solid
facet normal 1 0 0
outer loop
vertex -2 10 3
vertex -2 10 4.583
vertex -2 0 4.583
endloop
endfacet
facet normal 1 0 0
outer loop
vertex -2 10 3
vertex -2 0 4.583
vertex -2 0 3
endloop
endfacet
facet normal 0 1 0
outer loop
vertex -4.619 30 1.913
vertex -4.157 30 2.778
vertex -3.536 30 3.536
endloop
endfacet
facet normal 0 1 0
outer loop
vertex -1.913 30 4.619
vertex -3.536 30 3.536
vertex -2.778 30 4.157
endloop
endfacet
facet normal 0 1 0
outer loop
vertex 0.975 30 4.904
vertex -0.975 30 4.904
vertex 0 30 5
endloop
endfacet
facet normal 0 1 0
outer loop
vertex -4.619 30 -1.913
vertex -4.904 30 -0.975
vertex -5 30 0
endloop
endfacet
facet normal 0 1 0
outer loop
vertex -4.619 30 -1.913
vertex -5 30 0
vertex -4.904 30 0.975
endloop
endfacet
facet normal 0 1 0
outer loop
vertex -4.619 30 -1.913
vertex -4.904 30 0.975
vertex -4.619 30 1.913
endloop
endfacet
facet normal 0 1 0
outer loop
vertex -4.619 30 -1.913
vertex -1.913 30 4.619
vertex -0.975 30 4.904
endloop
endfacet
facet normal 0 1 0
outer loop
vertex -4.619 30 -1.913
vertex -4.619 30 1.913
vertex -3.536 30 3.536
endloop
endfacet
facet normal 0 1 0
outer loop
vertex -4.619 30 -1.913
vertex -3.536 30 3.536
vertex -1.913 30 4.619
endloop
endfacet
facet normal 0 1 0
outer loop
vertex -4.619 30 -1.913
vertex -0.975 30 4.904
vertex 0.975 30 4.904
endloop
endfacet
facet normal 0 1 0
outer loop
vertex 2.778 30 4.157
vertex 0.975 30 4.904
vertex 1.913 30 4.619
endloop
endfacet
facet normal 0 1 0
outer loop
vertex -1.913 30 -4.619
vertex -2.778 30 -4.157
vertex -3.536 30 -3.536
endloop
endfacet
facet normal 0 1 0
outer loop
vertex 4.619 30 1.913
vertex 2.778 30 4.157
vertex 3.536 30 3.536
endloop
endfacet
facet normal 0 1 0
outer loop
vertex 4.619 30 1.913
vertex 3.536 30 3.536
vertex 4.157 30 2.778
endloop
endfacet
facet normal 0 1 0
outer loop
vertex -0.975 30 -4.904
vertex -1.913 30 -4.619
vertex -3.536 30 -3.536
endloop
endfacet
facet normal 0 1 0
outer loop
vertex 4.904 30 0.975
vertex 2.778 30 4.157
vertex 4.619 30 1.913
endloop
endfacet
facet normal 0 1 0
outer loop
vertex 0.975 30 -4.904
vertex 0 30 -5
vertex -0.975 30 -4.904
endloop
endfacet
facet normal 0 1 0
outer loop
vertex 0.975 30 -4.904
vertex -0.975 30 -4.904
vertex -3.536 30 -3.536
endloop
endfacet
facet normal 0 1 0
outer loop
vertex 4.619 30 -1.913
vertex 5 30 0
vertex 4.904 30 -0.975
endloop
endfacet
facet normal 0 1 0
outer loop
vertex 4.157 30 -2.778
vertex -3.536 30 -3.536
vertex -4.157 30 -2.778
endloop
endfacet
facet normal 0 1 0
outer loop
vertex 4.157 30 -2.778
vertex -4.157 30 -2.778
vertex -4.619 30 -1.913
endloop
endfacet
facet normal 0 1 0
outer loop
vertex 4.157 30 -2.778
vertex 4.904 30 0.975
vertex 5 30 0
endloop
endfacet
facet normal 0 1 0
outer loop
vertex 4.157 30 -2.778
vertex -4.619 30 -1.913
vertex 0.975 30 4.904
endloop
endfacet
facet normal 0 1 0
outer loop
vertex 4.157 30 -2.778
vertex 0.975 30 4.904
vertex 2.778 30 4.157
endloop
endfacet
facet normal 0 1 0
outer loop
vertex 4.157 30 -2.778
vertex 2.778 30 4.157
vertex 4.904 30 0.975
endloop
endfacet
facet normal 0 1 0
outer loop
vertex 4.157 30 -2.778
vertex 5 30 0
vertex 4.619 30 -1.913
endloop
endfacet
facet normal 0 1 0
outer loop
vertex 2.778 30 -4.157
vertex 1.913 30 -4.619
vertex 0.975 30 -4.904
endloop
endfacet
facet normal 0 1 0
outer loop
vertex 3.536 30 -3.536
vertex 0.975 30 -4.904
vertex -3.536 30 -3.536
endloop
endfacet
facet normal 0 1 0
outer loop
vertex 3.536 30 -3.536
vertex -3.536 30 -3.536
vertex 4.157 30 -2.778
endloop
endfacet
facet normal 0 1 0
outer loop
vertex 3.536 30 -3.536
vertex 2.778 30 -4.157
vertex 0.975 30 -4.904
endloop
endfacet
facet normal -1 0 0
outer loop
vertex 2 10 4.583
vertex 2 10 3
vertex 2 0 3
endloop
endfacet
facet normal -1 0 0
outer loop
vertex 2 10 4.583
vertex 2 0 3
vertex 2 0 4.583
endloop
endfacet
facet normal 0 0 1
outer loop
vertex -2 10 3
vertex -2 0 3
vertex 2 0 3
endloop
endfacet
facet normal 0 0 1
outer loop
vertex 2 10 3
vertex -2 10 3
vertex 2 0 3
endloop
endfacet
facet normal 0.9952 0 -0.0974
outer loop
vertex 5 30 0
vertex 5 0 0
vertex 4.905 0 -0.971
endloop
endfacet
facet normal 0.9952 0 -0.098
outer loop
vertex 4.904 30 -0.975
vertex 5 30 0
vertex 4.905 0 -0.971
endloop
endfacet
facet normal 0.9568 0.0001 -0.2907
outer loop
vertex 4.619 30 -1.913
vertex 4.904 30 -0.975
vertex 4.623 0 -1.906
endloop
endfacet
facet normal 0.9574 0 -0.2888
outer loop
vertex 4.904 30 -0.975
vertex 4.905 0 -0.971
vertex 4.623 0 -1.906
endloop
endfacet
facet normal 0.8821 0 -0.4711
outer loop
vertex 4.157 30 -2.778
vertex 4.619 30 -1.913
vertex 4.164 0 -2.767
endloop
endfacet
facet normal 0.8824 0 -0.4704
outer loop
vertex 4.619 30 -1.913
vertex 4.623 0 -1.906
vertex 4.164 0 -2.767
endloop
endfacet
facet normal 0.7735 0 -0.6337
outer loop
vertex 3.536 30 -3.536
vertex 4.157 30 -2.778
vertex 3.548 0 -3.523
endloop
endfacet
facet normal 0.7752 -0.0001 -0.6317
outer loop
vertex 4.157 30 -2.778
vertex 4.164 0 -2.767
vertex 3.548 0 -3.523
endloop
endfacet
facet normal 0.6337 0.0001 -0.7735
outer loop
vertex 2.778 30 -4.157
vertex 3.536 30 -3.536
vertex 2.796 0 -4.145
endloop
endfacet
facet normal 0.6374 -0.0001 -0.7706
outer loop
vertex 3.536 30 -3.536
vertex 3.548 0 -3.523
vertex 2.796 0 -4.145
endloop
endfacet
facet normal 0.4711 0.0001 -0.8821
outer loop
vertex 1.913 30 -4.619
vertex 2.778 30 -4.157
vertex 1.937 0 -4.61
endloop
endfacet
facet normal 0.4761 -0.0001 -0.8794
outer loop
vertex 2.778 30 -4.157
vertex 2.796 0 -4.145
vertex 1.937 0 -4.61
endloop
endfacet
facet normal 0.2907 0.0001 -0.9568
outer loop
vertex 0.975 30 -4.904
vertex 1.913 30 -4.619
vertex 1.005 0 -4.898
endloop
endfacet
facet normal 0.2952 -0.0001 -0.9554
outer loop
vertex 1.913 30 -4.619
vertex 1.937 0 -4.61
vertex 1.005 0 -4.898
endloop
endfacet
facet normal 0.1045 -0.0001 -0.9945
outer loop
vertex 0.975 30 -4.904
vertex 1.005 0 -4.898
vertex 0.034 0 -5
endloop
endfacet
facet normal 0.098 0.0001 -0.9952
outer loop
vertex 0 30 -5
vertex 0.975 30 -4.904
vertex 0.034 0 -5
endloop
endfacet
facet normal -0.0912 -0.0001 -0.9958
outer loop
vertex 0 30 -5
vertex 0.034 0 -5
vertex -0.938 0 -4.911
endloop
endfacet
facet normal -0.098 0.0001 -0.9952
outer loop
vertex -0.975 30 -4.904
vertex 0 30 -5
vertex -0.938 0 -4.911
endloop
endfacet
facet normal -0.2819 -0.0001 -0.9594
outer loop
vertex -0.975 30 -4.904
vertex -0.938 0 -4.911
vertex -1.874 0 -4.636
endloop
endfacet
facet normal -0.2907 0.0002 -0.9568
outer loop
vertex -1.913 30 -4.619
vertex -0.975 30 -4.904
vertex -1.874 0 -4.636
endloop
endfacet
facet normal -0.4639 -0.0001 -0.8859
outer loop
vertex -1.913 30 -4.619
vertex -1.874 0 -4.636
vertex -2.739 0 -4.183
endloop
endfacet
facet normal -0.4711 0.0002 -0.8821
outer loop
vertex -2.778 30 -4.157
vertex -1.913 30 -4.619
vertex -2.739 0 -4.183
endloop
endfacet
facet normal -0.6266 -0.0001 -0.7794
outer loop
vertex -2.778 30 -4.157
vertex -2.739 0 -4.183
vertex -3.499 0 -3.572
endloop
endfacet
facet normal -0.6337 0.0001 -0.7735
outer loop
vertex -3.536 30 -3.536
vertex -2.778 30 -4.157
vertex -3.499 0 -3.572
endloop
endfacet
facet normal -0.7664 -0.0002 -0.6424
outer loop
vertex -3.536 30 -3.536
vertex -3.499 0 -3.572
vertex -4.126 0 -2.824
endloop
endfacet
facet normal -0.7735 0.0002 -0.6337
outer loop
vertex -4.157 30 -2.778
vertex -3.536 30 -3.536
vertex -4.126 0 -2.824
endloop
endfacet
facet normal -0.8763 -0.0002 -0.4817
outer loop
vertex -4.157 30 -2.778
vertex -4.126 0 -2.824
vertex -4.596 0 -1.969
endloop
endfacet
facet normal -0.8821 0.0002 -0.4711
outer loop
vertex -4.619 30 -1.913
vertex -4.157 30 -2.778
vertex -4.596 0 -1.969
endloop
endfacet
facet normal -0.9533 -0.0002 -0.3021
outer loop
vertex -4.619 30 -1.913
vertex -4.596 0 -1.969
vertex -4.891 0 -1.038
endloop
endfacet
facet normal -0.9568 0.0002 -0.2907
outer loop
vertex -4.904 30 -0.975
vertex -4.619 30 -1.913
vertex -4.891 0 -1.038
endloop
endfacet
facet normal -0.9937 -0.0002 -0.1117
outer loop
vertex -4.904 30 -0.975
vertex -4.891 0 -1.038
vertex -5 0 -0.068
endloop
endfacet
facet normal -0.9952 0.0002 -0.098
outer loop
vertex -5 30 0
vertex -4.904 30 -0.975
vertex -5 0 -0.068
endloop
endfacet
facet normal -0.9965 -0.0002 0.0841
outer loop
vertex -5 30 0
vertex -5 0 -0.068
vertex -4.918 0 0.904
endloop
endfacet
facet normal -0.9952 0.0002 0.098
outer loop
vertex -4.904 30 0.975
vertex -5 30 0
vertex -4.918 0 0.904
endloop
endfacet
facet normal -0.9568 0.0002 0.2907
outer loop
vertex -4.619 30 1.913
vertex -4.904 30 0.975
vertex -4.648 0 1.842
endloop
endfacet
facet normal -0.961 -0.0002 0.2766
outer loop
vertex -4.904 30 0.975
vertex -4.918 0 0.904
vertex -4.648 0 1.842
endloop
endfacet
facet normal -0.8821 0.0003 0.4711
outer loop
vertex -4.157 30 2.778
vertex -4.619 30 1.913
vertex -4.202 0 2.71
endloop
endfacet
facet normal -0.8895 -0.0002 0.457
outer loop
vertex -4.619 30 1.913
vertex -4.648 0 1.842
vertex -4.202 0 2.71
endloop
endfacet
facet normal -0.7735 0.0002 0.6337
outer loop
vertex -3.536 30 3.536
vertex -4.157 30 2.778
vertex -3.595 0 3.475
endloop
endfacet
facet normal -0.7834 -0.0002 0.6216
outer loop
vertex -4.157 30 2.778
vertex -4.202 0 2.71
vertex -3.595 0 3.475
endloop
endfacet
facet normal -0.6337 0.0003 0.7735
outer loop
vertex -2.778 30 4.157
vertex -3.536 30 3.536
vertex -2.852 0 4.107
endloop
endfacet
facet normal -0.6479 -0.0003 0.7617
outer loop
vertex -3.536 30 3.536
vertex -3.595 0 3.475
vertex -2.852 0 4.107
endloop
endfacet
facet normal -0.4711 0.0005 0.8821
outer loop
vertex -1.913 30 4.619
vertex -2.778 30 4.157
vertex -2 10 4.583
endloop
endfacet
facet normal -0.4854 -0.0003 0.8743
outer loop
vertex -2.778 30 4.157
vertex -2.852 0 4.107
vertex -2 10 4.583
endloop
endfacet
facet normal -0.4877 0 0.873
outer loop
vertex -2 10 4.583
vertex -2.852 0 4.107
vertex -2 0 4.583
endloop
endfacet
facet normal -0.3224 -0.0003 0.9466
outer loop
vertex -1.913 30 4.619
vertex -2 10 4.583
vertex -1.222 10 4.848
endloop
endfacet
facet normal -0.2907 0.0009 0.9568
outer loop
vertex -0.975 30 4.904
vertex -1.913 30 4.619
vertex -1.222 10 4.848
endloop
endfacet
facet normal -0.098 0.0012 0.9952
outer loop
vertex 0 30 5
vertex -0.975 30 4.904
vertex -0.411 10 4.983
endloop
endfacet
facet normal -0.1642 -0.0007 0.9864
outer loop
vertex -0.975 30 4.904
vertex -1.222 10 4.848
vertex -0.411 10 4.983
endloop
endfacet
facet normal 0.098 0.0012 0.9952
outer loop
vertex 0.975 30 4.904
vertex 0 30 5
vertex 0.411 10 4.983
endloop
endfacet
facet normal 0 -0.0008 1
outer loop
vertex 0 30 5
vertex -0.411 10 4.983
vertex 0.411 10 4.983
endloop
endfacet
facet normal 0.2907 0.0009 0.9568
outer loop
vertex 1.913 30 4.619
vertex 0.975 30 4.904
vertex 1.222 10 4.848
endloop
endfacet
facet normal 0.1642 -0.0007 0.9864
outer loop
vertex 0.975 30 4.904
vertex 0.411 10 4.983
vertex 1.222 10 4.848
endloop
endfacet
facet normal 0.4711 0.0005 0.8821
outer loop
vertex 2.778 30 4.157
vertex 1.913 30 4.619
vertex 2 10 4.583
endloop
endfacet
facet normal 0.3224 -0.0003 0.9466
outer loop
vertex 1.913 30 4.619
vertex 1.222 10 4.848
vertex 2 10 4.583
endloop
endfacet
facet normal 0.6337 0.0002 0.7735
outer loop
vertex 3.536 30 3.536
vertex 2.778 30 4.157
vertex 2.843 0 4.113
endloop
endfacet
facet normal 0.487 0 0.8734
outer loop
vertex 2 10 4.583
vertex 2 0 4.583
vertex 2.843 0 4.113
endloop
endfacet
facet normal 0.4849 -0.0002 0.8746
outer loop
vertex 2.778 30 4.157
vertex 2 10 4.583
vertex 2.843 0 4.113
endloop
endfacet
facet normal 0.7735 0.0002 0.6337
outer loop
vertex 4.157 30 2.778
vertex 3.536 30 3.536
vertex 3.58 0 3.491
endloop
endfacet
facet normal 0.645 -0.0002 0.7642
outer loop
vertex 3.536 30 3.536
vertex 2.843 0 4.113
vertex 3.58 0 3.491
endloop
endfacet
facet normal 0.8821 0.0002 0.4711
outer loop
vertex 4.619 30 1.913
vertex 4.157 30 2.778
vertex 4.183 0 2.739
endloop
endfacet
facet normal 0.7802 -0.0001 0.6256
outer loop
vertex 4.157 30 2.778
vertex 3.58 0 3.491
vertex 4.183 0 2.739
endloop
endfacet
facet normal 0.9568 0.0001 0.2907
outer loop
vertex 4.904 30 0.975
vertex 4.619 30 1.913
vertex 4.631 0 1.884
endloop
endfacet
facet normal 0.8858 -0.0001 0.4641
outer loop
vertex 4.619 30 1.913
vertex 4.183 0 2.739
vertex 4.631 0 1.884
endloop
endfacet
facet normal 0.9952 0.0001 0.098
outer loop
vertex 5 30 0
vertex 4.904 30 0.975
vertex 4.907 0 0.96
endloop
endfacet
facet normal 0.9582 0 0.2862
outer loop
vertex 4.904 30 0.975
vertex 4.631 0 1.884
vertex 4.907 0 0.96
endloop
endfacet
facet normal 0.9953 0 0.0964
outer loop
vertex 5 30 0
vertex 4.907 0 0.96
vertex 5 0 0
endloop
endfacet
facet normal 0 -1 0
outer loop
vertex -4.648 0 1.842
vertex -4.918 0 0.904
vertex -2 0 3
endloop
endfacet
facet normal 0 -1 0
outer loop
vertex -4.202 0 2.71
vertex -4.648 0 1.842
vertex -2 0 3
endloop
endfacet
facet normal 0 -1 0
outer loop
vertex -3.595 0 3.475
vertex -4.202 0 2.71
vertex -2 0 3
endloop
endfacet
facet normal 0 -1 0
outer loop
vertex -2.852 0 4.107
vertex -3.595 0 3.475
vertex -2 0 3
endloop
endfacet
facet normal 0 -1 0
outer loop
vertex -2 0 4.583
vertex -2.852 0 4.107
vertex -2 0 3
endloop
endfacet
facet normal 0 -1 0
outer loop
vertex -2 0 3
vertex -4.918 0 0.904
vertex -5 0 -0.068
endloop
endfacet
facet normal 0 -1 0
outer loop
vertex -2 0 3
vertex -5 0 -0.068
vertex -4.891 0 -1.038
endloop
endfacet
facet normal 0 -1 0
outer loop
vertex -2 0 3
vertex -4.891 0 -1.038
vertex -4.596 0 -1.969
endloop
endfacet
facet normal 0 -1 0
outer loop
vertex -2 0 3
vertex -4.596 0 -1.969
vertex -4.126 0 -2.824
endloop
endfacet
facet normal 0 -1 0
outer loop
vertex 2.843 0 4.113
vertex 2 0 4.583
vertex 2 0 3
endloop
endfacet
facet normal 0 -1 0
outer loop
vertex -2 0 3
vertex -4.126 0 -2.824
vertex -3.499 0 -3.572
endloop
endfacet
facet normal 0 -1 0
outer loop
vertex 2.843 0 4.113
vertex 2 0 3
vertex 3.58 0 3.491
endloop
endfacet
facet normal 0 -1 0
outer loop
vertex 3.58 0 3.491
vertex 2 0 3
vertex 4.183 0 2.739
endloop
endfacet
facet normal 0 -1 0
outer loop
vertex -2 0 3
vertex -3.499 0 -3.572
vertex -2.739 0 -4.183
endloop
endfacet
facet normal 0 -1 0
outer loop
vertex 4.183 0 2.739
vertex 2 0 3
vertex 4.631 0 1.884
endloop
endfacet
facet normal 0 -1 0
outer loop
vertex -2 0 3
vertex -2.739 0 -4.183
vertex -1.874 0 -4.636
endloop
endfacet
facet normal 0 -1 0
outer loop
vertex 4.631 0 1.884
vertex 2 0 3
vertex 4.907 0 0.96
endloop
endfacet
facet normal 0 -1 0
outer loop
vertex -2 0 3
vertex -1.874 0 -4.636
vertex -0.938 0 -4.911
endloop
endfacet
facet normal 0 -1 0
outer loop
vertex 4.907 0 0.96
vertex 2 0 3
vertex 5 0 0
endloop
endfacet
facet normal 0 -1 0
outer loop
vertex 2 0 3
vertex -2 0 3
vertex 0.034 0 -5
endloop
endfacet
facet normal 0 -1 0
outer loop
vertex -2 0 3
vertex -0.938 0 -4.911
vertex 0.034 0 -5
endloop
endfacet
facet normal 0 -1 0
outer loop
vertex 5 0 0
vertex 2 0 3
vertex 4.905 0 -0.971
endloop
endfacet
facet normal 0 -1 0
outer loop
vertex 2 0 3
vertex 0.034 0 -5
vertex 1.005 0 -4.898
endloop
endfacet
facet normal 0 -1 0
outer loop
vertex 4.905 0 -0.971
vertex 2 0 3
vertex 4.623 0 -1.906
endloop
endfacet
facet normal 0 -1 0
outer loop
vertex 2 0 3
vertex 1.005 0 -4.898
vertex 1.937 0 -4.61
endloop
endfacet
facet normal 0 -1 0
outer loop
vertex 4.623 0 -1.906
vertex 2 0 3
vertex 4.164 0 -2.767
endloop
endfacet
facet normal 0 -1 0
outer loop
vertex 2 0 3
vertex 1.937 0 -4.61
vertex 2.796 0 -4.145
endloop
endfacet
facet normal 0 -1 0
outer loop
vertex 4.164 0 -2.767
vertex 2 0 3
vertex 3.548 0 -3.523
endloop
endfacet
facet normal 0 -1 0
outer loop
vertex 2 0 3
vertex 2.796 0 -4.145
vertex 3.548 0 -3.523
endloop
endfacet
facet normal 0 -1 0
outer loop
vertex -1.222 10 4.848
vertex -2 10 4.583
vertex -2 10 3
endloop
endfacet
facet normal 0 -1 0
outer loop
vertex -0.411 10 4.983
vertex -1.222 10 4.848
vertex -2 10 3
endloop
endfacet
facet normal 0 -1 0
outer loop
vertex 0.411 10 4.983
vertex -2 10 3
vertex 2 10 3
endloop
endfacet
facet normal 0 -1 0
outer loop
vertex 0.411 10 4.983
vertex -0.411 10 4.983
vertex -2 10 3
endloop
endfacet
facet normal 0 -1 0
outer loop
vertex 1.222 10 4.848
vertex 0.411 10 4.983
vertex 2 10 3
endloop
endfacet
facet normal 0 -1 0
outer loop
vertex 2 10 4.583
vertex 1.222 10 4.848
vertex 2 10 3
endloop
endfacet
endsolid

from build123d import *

# Parameters (mm, degrees)
SKETCH1_R           = 5
BOSS_EXTRUDE1_DEPTH = 30
CUT_EXTRUDE1_DEPTH  = 10


with BuildPart() as part:
    # Sketch1 → Boss-Extrude1 (new body)
    with BuildSketch(Plane(origin=(0, 0, 0), x_dir=(1, 0, 0), z_dir=(0, 1, 0))):
        Circle(SKETCH1_R)
    extrude(amount=BOSS_EXTRUDE1_DEPTH)

    # Sketch2 → Cut-Extrude1 (cut)
    with BuildSketch(Plane.XZ):
        with BuildLine():
            Line((-2, 3), (2, 3))
            Line((2, 3), (2, 4.582575695))
            ThreePointArc((2, 4.582575695), (0, 5), (-2, 4.582575695))
            Line((-2, 4.582575695), (-2, 3))
        make_face()
    extrude(amount=-CUT_EXTRUDE1_DEPTH, mode=Mode.SUBTRACT)


solid = part.part
